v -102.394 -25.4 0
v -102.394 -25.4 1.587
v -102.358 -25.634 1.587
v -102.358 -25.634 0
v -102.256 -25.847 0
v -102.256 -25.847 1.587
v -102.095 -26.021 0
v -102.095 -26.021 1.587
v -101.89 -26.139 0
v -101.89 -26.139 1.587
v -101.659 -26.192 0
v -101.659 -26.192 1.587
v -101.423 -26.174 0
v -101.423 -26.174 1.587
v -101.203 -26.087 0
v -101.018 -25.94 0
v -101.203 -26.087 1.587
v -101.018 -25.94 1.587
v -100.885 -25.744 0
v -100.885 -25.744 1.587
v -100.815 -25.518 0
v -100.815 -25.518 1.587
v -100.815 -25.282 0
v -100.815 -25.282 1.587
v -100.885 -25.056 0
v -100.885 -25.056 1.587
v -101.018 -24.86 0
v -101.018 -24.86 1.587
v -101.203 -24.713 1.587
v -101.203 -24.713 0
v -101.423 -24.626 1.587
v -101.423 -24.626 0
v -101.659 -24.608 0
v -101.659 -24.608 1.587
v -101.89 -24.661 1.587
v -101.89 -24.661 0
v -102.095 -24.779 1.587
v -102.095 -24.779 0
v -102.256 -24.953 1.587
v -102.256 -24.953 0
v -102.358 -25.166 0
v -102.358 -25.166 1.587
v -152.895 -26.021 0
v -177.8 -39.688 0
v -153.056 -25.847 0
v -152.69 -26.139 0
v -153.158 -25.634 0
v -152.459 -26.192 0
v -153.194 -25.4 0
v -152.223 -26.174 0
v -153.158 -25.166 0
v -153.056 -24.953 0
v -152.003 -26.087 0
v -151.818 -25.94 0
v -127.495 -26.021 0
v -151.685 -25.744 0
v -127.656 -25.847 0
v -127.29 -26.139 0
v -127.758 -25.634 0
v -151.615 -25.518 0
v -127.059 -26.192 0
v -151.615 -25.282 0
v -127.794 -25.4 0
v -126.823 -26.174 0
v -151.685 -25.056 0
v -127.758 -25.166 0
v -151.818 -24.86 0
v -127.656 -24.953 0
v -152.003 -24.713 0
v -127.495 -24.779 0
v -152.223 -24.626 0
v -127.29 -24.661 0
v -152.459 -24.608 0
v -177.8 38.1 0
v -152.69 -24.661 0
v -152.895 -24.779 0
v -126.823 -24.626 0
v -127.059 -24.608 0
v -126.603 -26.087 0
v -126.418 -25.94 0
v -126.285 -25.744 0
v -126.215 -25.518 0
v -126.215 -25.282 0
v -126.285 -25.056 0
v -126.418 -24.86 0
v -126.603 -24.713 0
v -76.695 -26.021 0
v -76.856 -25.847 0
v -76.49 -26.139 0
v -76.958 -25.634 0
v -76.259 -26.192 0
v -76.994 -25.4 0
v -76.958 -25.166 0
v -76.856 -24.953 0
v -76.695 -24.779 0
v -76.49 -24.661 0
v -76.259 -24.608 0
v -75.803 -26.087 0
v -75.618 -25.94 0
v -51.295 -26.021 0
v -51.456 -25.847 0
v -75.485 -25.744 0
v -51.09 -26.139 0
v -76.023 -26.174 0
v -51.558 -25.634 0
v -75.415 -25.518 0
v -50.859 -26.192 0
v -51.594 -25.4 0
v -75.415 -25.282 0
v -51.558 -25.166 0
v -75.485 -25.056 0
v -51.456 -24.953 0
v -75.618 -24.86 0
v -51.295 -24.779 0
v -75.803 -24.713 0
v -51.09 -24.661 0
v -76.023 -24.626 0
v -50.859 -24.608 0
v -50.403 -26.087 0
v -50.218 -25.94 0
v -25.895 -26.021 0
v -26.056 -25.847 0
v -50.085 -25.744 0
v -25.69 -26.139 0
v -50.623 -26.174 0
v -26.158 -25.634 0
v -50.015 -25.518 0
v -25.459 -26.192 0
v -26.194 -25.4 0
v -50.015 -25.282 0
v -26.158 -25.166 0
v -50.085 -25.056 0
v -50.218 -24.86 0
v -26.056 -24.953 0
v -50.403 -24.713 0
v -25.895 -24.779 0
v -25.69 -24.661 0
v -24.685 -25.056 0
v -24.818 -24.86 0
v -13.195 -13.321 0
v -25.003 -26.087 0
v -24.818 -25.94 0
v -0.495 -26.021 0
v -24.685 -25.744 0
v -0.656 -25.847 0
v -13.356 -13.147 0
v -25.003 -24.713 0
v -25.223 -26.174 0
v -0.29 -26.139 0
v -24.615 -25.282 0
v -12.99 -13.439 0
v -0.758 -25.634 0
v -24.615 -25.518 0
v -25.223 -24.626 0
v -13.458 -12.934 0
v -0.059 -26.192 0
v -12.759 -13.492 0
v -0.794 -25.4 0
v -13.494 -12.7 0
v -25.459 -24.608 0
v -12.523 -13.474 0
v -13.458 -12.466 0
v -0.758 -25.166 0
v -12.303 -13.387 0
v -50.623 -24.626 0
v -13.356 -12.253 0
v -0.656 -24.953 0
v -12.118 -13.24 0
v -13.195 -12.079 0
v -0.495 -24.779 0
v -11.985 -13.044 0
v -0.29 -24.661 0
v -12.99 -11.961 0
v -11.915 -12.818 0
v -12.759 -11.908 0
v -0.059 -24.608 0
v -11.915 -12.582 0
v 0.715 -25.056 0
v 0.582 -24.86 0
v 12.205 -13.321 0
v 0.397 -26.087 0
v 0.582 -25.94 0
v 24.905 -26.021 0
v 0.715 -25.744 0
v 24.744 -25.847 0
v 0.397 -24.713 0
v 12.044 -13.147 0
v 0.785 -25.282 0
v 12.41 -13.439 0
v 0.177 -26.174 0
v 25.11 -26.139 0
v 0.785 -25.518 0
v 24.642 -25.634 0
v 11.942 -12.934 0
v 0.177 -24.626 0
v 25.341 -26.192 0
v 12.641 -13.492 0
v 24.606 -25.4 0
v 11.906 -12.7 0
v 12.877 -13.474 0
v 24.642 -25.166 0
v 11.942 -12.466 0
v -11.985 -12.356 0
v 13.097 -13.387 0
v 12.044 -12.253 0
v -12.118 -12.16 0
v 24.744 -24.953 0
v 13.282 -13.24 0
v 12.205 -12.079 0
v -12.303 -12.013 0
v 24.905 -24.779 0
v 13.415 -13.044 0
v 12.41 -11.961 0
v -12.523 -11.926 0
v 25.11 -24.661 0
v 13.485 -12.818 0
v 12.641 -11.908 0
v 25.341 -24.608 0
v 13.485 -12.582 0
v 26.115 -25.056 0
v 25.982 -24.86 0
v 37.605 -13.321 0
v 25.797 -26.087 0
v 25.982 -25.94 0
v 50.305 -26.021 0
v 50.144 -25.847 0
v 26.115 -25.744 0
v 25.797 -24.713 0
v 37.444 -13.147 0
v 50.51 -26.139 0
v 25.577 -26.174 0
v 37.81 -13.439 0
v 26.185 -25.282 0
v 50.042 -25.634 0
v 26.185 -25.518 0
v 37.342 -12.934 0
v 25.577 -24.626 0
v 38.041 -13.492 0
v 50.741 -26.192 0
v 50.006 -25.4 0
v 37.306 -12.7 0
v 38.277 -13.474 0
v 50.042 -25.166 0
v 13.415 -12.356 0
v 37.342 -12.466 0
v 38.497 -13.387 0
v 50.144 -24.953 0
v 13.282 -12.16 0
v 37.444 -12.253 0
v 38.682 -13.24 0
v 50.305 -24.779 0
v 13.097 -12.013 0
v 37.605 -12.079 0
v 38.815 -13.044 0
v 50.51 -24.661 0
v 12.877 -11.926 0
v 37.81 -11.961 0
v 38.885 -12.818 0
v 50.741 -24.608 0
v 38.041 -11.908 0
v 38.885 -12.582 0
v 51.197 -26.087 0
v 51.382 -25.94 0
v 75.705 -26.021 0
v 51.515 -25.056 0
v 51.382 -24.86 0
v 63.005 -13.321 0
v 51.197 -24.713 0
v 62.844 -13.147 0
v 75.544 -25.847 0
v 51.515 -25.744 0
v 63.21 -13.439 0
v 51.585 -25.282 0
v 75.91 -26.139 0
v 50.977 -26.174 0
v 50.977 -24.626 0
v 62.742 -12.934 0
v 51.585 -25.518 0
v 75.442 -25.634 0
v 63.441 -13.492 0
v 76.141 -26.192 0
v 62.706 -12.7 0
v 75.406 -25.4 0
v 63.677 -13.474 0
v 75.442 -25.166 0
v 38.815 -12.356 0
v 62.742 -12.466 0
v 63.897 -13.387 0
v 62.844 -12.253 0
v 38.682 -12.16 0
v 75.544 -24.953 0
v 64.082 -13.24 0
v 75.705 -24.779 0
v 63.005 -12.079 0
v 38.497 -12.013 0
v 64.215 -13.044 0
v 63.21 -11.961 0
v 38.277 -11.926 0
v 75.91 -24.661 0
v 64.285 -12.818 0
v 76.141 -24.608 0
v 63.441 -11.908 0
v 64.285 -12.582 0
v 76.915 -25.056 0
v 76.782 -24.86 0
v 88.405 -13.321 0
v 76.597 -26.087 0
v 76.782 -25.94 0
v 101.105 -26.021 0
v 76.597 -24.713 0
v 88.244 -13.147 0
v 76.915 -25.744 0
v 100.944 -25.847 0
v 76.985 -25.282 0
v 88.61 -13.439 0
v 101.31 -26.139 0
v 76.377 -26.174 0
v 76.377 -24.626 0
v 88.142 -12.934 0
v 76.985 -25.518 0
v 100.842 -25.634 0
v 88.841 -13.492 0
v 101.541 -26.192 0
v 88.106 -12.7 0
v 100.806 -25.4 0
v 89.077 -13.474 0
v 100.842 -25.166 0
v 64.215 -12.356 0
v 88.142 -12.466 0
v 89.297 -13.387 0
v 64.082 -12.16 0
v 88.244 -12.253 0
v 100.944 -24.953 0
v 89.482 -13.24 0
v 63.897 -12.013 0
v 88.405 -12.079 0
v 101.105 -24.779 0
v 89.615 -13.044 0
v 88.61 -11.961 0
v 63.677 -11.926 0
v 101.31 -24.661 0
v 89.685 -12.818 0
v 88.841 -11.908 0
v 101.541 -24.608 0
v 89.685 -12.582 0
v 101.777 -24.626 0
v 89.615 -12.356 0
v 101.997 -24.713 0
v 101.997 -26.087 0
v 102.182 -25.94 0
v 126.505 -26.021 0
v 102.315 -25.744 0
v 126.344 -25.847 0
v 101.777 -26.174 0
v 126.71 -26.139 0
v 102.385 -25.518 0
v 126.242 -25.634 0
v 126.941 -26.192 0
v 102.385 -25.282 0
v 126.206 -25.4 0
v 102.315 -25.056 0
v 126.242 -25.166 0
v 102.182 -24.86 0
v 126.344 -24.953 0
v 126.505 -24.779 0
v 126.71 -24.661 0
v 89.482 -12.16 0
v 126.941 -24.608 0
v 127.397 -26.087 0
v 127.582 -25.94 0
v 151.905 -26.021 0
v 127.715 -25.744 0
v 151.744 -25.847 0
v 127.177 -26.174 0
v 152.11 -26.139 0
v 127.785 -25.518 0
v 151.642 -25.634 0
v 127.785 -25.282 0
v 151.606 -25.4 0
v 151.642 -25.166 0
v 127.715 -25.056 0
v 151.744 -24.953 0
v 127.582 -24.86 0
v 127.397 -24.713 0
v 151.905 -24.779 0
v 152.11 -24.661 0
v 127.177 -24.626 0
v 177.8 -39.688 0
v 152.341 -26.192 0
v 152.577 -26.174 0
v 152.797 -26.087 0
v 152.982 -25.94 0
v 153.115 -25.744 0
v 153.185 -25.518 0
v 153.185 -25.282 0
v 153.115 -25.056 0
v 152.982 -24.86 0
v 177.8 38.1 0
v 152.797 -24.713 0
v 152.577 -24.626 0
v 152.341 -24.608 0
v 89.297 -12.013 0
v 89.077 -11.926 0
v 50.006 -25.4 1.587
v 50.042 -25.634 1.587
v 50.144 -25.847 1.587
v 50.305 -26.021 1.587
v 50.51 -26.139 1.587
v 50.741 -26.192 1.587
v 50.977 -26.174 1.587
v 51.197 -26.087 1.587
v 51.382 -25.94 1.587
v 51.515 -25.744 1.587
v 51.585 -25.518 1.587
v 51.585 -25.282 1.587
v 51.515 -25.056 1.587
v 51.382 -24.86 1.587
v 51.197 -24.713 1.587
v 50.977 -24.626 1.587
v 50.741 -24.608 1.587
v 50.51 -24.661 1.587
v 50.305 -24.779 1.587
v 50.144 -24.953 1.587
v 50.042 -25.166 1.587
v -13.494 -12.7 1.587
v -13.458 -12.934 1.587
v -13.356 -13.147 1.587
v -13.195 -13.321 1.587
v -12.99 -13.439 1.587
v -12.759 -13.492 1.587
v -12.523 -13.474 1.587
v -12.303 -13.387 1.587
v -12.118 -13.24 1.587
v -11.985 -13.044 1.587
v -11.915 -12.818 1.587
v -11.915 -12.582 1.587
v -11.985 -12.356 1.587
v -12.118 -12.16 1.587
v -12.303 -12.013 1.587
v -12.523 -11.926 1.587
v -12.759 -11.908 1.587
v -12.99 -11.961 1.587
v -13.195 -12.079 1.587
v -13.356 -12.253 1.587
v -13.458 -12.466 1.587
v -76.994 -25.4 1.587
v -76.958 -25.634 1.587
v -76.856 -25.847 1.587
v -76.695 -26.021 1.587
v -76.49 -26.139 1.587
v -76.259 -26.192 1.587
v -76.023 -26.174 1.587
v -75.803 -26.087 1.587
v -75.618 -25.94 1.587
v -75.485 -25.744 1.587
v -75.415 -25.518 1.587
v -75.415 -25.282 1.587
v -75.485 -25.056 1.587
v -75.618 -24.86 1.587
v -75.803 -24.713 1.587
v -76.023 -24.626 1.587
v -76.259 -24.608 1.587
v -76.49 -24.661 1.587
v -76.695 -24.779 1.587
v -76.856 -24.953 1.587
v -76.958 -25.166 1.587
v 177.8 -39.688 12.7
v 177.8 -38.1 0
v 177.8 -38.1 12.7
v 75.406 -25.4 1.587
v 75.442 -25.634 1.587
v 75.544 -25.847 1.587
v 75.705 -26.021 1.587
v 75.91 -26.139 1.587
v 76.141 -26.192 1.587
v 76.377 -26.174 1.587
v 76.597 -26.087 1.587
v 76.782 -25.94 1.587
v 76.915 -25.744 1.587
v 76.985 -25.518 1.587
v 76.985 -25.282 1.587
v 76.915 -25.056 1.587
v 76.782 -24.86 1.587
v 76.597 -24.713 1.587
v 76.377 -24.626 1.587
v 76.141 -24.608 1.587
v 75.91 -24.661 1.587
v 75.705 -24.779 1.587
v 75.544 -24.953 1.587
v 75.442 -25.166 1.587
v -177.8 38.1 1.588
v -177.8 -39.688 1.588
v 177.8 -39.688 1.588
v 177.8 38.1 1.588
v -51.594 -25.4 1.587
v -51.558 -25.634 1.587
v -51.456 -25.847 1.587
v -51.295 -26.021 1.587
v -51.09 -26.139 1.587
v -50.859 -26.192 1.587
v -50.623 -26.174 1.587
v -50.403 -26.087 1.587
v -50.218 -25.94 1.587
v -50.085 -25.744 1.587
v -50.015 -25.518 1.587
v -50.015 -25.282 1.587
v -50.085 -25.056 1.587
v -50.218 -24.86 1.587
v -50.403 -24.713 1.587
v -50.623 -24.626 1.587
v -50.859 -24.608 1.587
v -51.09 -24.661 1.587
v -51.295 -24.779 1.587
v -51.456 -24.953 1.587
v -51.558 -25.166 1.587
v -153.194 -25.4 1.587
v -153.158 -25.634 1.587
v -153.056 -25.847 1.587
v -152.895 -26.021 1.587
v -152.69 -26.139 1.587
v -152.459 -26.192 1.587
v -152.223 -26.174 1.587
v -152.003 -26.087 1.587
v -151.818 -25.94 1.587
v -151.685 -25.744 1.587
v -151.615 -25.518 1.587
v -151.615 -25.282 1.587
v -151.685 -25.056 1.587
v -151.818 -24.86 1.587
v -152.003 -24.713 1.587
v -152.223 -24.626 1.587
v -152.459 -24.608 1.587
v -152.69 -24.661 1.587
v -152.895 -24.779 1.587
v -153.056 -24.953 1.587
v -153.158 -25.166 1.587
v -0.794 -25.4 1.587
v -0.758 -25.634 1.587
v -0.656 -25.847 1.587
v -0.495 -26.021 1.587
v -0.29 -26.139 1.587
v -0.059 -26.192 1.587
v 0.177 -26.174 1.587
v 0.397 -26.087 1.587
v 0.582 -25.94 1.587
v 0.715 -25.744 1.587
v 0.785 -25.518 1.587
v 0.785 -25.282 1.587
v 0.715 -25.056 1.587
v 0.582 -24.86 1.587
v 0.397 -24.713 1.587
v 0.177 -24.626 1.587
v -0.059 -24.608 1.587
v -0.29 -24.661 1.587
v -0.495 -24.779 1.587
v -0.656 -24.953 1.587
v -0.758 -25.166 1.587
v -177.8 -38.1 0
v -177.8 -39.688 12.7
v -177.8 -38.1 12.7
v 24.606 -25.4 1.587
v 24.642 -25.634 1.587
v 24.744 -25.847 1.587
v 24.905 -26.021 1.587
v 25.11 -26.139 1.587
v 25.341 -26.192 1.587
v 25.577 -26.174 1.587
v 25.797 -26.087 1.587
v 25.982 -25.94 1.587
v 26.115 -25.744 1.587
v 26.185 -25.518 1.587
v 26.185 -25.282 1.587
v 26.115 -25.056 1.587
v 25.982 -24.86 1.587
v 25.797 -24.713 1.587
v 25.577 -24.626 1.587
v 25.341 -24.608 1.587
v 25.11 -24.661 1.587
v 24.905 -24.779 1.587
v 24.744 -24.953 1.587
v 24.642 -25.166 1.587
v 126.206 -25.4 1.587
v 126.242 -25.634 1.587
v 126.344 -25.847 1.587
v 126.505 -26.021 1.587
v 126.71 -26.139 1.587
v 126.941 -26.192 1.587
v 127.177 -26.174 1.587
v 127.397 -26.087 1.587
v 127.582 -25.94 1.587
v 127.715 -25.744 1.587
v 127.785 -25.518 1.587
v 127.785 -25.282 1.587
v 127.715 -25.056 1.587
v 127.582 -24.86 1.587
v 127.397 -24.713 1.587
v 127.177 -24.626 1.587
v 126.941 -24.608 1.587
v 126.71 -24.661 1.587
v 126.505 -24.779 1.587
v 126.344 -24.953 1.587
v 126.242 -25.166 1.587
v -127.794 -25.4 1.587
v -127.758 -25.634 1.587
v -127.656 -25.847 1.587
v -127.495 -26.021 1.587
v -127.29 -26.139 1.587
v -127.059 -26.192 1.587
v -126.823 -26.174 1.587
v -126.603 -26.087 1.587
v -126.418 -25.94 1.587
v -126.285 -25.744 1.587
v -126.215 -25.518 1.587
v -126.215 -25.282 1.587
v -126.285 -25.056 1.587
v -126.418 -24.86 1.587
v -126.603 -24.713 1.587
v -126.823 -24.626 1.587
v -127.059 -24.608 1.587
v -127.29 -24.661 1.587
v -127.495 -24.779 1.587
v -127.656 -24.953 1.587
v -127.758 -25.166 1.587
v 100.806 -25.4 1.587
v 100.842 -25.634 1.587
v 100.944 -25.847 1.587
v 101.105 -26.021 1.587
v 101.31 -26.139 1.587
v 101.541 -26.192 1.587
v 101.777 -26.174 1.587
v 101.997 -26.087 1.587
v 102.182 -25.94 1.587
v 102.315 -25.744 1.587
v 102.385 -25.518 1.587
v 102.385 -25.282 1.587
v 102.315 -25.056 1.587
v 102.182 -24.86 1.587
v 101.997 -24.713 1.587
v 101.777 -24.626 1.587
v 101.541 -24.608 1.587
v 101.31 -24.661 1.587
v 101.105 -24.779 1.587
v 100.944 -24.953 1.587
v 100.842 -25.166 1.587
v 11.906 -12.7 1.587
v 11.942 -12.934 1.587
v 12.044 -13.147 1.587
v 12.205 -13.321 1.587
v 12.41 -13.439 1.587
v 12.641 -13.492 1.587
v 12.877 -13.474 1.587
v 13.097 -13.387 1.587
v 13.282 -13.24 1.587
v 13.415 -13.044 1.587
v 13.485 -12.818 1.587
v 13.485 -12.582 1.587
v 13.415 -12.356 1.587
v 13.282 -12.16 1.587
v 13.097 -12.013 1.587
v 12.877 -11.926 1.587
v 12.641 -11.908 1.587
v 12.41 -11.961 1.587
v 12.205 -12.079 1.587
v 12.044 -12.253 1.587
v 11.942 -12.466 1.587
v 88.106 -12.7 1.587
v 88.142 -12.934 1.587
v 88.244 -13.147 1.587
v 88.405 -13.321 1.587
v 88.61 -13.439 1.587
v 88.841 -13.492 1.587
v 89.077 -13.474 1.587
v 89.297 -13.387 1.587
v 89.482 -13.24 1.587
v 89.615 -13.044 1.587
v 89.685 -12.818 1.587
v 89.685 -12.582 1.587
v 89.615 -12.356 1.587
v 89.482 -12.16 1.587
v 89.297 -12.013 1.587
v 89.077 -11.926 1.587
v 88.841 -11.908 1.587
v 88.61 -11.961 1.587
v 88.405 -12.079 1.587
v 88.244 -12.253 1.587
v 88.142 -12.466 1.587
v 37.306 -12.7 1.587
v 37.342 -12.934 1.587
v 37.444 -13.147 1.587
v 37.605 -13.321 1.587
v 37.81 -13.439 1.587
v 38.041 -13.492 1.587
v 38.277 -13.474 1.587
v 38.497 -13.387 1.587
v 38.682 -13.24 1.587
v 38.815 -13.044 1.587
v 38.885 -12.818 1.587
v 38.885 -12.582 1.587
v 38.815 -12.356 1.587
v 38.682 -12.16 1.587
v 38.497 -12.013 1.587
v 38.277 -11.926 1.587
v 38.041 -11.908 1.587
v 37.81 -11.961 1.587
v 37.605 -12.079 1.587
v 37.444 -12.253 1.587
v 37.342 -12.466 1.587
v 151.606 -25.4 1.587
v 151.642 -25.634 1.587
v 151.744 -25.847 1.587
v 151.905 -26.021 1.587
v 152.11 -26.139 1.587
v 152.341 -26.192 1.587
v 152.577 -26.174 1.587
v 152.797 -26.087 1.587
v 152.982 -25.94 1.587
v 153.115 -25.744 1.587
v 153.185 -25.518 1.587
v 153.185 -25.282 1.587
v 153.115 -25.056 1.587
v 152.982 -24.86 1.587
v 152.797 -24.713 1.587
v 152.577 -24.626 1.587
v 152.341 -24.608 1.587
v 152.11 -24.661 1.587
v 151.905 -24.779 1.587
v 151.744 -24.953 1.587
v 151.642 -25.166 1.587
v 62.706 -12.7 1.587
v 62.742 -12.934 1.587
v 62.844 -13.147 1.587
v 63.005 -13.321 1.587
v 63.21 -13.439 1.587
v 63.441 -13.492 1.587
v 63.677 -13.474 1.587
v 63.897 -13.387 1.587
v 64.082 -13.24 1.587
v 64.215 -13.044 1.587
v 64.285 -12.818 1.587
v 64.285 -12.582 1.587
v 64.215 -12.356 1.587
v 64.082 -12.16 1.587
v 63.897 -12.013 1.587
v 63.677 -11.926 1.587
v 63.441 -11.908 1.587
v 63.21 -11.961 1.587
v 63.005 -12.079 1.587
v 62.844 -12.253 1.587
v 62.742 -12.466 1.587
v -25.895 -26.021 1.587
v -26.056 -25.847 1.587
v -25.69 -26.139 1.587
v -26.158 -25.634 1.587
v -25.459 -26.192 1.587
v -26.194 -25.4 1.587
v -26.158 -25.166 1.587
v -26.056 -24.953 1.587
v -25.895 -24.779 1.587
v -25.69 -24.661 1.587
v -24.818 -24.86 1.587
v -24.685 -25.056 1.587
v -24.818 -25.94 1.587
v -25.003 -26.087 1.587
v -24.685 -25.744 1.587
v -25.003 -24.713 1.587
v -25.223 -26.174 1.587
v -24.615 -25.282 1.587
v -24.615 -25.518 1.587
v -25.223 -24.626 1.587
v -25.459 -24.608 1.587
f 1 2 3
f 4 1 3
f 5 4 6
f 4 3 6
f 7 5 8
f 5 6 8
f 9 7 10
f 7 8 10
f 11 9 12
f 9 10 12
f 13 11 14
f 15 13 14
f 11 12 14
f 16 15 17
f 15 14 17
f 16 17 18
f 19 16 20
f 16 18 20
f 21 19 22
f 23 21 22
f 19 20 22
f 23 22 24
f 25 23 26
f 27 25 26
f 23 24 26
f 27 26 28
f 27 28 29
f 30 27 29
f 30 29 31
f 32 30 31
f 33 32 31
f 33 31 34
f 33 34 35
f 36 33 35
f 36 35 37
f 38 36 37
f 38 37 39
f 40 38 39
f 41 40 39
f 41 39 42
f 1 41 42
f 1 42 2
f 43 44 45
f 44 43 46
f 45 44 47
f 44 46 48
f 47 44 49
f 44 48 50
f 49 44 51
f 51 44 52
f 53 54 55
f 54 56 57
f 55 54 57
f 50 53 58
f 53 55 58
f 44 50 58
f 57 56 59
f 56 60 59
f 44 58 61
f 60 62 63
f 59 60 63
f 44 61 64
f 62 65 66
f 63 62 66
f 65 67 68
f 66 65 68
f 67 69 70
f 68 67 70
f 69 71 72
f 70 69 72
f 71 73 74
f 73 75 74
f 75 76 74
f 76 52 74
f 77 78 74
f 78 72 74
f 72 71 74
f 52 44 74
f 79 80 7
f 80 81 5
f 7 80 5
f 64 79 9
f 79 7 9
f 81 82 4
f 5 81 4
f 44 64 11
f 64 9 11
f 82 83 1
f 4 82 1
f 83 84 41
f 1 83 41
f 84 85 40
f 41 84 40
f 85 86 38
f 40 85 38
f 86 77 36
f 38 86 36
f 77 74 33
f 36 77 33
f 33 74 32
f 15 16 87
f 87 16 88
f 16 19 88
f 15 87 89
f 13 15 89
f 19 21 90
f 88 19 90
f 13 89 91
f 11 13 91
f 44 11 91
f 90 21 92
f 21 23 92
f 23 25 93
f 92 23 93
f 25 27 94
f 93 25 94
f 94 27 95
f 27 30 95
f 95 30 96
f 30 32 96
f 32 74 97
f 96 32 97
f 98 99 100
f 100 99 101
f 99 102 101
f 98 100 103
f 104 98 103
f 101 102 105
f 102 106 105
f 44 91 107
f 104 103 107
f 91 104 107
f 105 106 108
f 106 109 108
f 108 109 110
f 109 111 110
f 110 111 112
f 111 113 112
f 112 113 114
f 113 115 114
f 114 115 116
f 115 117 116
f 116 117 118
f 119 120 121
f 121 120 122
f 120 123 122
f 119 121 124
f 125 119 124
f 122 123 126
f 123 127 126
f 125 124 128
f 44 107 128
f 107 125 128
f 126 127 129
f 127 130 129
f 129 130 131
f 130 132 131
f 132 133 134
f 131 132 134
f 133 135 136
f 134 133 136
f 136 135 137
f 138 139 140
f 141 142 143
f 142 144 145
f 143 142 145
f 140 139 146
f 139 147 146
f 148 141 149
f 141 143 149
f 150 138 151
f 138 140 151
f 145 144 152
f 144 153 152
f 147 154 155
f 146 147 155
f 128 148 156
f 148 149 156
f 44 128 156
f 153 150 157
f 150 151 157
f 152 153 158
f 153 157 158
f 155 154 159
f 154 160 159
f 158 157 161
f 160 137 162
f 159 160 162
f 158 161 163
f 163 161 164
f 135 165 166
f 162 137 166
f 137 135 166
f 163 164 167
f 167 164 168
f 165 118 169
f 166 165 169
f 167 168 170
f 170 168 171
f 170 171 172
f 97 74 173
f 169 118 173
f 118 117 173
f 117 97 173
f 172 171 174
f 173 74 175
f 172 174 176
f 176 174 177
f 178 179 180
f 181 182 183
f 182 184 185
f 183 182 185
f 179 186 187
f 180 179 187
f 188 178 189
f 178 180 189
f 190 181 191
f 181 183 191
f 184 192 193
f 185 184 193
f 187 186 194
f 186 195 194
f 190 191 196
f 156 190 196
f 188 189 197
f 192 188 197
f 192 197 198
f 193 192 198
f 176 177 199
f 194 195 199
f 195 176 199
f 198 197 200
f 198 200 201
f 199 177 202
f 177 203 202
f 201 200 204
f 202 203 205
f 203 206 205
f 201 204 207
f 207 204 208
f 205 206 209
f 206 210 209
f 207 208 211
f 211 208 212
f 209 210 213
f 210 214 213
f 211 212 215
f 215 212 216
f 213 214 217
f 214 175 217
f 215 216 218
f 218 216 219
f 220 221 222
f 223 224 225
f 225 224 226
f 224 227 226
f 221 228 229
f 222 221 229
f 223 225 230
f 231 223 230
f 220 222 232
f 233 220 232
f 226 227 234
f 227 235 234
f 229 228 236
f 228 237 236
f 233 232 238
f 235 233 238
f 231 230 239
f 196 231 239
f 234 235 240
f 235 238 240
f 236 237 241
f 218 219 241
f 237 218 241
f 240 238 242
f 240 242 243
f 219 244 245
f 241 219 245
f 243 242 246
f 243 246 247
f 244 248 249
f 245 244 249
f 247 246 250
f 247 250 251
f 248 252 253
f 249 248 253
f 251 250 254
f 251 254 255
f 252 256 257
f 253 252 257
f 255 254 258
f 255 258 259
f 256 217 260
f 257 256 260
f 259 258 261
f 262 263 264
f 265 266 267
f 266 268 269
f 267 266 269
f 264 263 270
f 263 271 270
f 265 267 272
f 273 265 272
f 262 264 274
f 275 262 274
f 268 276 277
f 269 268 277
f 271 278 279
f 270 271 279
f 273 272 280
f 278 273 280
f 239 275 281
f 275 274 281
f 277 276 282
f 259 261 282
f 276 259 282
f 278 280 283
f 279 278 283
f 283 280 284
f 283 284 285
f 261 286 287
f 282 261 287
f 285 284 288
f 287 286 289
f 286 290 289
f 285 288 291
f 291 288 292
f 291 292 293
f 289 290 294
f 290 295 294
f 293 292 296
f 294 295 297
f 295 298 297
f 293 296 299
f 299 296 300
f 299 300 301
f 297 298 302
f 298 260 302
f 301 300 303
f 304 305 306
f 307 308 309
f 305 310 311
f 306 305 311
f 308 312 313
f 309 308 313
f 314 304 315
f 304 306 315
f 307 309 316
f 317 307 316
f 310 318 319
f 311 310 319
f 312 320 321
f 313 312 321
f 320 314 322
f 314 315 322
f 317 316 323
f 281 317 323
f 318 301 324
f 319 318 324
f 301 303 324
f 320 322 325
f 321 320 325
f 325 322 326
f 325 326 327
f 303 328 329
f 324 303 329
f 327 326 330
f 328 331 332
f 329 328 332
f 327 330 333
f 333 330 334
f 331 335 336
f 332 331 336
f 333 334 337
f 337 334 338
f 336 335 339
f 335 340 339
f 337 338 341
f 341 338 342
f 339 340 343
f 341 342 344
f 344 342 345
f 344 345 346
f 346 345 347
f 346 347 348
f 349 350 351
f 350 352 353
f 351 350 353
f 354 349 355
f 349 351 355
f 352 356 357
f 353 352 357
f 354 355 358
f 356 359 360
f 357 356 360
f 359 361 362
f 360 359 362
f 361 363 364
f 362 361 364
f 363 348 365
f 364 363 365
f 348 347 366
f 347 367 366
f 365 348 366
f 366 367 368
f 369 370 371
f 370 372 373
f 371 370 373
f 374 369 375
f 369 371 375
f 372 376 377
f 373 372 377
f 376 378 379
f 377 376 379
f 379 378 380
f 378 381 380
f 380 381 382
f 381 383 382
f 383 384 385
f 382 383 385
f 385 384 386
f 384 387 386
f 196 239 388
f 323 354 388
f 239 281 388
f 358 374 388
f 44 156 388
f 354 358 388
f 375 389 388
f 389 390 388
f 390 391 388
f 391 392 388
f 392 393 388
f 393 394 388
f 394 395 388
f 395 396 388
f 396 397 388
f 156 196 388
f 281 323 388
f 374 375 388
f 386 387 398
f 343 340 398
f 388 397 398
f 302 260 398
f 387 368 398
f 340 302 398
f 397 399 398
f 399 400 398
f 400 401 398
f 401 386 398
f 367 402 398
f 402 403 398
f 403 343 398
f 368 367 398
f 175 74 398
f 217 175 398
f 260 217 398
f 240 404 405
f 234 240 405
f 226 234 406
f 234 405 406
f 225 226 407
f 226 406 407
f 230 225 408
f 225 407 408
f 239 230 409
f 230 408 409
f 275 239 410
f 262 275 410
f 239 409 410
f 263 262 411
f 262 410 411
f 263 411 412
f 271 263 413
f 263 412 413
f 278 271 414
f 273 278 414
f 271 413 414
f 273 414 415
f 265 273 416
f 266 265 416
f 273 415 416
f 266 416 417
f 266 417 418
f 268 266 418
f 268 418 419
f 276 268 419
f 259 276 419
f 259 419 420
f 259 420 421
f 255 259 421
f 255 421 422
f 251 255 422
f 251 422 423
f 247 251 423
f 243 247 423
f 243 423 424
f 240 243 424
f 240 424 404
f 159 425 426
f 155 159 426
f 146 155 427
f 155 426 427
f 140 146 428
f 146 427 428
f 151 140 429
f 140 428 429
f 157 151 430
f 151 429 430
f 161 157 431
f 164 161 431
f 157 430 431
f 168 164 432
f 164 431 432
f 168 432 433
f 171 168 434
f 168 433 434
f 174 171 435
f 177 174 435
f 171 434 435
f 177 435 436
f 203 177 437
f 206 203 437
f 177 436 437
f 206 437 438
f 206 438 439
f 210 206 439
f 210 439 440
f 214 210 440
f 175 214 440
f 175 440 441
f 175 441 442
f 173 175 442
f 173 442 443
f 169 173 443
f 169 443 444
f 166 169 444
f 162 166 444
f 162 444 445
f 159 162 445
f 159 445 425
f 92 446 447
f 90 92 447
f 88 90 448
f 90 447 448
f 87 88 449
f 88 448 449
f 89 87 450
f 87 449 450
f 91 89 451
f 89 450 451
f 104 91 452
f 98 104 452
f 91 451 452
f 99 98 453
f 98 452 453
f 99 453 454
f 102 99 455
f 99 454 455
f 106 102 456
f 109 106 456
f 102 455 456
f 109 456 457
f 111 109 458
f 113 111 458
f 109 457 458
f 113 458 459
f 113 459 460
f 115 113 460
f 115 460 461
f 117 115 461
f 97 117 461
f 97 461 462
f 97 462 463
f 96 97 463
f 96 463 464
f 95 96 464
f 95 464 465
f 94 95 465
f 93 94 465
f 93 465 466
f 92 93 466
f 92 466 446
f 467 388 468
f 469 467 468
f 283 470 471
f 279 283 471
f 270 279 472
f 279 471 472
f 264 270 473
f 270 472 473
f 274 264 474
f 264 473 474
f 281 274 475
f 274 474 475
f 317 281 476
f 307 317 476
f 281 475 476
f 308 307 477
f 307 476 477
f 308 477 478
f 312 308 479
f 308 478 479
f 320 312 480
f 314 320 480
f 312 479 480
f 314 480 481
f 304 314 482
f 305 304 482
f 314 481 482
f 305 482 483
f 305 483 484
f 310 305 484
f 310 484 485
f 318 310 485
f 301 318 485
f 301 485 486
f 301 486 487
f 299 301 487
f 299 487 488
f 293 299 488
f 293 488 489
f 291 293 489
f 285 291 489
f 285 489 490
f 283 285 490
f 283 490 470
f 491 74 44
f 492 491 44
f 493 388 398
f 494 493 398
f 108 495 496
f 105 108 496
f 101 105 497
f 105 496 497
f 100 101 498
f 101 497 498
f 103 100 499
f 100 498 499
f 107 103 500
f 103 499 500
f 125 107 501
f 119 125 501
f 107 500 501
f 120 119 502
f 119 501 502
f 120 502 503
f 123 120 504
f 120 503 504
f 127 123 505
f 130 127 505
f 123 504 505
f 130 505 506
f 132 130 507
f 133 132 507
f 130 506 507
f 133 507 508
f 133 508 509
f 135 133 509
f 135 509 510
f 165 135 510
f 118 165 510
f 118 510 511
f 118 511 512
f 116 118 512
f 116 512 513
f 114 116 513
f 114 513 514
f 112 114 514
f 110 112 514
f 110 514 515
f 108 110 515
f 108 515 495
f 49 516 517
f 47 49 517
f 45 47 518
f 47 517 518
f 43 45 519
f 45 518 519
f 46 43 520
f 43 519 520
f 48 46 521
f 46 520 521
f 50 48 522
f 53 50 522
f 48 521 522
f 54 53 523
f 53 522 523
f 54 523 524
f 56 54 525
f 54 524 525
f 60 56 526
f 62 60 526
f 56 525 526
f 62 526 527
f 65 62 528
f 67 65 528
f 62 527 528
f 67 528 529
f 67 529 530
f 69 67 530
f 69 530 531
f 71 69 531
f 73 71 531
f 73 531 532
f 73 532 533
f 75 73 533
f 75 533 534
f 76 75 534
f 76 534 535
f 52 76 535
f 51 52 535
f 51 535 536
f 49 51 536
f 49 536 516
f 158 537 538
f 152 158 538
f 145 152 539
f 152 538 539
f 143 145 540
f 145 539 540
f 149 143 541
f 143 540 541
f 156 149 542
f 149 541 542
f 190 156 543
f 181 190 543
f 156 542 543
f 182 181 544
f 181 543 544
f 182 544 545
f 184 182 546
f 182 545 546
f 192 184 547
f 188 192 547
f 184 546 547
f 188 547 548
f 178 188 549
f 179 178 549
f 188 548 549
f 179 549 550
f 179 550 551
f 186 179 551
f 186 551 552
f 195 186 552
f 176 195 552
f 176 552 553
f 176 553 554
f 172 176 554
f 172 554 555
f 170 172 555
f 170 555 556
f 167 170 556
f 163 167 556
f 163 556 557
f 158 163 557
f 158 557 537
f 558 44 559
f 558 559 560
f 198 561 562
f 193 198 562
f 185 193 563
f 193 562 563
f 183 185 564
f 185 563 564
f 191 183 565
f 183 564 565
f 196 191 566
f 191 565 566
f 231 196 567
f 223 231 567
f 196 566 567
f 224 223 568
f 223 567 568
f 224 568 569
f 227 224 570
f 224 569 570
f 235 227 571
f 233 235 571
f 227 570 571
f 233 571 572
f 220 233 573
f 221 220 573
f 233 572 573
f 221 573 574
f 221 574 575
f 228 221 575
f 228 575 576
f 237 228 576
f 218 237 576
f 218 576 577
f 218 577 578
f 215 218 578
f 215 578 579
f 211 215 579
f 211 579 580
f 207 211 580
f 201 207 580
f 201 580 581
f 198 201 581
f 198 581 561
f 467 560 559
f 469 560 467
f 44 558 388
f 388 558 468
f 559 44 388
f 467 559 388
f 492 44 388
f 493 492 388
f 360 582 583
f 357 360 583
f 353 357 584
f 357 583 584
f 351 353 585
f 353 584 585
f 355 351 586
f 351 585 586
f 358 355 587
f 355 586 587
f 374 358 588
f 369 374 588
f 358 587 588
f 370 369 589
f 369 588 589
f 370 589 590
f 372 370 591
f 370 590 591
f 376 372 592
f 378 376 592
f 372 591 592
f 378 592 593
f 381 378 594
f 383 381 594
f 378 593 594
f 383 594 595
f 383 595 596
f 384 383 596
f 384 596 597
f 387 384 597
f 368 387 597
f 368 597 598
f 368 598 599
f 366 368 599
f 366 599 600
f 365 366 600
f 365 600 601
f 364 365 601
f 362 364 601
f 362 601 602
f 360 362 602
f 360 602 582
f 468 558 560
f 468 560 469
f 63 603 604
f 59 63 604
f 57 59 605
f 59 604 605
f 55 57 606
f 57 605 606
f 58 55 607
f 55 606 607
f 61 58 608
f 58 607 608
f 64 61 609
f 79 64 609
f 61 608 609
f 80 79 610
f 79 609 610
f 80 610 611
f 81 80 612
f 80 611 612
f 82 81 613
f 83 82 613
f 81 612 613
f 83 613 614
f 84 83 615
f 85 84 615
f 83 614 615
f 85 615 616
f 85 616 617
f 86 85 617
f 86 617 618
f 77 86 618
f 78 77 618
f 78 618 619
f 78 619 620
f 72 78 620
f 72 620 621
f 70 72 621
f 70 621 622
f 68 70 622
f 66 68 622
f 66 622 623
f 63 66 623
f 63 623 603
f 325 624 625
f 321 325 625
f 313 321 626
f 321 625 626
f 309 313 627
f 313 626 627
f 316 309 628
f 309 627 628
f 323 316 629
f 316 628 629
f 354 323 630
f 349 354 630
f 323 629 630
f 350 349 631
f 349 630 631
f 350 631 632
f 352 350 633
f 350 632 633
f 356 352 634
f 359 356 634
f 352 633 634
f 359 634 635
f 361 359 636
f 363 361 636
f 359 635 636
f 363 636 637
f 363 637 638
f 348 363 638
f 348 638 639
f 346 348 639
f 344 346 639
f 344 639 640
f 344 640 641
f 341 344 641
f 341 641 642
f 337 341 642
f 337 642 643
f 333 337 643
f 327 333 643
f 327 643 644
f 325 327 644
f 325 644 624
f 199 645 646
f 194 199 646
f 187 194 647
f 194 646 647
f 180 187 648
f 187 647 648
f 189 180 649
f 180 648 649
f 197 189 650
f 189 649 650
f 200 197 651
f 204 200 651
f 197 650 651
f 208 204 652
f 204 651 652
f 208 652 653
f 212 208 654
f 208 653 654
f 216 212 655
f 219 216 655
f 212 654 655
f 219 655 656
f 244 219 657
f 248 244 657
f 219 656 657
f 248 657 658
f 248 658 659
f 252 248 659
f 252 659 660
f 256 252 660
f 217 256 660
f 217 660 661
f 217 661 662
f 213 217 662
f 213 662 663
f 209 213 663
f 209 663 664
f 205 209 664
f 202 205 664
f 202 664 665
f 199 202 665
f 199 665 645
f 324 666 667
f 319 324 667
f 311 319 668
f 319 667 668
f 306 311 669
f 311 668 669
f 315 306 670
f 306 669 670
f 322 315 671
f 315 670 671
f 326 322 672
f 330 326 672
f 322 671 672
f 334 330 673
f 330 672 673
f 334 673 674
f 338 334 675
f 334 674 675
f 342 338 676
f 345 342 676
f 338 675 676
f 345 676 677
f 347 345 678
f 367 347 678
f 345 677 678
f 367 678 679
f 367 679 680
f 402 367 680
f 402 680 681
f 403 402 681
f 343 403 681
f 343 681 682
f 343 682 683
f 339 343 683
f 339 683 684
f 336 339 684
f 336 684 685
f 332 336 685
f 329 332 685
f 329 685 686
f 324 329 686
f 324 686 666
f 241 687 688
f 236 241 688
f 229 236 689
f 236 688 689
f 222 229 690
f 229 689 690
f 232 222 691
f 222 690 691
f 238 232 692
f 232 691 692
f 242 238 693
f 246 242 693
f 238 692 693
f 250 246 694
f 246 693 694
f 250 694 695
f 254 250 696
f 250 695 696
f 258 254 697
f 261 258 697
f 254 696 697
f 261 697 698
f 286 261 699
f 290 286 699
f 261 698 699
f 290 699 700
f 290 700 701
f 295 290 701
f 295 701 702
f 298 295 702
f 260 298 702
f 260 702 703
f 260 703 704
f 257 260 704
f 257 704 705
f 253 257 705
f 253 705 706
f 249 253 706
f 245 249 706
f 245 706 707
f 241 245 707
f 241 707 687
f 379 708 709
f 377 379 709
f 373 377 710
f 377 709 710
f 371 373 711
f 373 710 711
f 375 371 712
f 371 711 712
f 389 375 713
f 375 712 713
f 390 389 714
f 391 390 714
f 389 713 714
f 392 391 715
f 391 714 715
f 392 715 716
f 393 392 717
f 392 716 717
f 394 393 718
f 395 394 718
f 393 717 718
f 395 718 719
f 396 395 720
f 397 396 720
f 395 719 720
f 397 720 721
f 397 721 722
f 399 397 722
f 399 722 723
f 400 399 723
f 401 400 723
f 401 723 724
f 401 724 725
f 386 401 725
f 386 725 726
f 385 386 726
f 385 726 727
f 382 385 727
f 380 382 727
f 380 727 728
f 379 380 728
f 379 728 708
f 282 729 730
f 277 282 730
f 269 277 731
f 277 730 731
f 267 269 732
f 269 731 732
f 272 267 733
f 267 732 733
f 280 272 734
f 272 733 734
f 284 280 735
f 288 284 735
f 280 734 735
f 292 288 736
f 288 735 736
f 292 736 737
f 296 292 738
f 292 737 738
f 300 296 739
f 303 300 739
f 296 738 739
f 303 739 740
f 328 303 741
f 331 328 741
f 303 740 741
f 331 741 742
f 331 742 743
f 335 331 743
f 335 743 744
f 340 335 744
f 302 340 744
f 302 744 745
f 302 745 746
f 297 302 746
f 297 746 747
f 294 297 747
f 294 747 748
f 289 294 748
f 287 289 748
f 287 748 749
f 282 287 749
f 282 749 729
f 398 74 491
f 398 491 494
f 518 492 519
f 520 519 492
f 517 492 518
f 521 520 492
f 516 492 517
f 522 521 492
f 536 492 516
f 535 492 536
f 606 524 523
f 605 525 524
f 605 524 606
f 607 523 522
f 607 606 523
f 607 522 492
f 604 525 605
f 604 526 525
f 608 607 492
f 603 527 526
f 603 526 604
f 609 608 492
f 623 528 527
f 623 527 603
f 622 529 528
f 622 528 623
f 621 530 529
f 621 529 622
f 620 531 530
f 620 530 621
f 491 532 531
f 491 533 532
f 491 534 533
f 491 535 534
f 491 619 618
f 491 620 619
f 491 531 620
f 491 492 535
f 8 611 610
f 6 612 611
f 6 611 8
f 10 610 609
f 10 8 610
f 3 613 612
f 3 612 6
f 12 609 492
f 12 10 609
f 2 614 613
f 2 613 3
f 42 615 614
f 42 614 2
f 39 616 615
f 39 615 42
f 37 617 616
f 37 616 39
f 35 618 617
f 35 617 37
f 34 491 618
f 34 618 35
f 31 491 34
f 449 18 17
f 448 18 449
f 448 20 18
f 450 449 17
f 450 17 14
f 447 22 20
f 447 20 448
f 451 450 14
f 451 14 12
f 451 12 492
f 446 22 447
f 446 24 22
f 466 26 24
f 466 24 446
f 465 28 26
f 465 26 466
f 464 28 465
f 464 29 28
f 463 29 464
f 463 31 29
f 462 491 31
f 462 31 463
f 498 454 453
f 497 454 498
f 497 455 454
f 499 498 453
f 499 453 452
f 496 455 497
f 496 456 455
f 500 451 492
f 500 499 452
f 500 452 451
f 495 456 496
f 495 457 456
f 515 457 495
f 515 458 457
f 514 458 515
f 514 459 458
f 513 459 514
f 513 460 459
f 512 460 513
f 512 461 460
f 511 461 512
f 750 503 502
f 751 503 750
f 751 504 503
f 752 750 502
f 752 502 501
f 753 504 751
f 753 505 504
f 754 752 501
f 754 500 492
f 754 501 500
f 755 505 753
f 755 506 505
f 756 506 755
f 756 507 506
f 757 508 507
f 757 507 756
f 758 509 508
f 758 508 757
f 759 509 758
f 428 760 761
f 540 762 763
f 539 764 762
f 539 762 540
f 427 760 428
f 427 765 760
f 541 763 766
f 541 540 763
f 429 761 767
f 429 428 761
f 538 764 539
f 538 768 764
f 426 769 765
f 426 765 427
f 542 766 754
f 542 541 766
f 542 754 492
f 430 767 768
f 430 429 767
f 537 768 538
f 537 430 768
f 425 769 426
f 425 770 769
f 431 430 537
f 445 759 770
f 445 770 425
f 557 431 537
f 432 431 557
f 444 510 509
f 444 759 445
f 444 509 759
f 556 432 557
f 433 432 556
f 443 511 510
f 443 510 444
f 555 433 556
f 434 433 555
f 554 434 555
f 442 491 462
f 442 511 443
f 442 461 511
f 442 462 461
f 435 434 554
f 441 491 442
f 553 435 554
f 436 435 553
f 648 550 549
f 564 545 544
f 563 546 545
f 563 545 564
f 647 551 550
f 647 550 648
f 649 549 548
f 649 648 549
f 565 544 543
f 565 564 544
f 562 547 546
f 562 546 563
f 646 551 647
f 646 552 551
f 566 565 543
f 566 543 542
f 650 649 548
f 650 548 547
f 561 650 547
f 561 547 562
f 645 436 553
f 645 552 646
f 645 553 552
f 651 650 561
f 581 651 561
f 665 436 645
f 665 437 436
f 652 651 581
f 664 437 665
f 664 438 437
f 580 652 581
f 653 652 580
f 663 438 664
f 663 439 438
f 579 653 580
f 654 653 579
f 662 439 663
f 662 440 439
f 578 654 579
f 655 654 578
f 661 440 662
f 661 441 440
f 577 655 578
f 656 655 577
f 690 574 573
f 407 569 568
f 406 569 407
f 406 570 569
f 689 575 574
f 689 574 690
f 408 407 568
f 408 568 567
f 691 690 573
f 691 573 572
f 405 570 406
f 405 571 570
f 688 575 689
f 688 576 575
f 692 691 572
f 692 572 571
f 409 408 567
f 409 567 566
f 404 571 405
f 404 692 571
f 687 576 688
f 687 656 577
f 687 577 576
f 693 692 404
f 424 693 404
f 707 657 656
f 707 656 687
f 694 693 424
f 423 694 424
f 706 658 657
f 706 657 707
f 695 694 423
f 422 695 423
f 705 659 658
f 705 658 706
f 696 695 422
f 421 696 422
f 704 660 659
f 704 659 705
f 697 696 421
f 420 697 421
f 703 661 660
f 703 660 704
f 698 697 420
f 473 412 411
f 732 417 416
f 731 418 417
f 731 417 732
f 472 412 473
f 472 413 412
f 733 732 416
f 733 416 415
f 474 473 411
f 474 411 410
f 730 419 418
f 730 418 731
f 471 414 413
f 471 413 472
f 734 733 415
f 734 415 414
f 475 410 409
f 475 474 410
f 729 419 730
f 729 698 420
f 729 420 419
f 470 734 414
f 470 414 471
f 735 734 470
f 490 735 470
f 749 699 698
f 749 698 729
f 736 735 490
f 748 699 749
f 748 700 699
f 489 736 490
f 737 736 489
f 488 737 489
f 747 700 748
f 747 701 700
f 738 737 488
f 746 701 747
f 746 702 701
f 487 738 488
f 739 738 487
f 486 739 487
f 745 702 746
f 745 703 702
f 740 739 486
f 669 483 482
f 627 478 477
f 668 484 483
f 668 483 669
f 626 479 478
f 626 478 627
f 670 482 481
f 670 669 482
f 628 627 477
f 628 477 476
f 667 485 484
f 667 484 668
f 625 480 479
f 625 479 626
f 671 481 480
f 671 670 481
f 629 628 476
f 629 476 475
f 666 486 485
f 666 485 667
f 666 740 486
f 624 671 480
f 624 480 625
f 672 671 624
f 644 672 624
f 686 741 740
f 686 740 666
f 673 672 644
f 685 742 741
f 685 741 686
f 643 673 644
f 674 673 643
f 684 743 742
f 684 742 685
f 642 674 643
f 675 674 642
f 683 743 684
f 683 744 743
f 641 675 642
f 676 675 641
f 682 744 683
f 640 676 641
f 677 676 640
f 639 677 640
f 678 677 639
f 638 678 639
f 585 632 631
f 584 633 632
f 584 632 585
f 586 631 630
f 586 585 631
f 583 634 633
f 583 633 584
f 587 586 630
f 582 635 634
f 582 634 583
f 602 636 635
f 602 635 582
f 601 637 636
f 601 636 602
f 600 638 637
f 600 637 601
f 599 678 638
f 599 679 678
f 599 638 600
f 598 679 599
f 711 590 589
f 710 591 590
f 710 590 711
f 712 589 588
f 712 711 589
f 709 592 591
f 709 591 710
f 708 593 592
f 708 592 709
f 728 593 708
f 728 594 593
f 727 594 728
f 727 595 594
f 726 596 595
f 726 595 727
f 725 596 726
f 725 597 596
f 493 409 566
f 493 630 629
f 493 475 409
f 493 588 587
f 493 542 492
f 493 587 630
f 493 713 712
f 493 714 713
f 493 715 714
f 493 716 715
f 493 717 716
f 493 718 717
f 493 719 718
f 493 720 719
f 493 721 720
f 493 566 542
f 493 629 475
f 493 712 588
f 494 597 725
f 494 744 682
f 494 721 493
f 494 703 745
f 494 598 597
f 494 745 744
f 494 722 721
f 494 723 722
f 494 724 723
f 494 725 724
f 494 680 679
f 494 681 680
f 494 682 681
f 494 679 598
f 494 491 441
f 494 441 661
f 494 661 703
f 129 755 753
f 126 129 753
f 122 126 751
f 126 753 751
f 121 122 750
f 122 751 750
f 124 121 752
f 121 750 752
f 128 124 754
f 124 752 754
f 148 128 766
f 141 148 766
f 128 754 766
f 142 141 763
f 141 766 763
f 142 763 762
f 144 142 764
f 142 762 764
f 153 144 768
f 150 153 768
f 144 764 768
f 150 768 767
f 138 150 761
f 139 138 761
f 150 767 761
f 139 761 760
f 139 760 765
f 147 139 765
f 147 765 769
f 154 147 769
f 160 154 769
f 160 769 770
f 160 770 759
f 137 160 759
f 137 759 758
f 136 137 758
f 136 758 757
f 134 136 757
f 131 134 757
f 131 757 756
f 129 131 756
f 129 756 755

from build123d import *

# Parameters (mm, degrees)
F0_W     = 355.6
F0_H     = 1.5875
F1_DEPTH = 12.7
F0_H_2   = 76.2
F2_DEPTH = 1.5875
F3_D     = 1.5875


with BuildPart() as f1:
    # F0 (on Top) → F1 (new body)
    with BuildSketch(Plane.XY):
        with Locations((0, -38.89375)):
            Rectangle(F0_W, F0_H)
    extrude(amount=F1_DEPTH)


with BuildPart() as f2:
    # F0 (on Top) → F2 (new body)
    with BuildSketch(Plane.XY):
        Rectangle(F0_W, F0_H_2)
        with Locations((0, -38.89375)):
            Rectangle(F0_W, F0_H)
    extrude(amount=F2_DEPTH)

    # F3 (through all)
    with Locations(Plane(origin=(0, 0, 0), x_dir=(1, 0, 0), z_dir=(0, 0, -1))):
        with Locations((0, 25.4), (-25.4, 25.4), (-50.8, 25.4), (-76.2, 25.4), (50.8, 25.4), (25.4, 25.4), (76.2, 25.4), (101.6, 25.4), (127, 25.4), (152.4, 25.4), (-101.6, 25.4), (-127, 25.4), (-152.4, 25.4), (-12.7, 12.7), (12.7, 12.7), (38.1, 12.7), (63.5, 12.7), (88.9, 12.7)):
            Hole(F3_D / 2)


solid = Compound([f1.part, f2.part])
